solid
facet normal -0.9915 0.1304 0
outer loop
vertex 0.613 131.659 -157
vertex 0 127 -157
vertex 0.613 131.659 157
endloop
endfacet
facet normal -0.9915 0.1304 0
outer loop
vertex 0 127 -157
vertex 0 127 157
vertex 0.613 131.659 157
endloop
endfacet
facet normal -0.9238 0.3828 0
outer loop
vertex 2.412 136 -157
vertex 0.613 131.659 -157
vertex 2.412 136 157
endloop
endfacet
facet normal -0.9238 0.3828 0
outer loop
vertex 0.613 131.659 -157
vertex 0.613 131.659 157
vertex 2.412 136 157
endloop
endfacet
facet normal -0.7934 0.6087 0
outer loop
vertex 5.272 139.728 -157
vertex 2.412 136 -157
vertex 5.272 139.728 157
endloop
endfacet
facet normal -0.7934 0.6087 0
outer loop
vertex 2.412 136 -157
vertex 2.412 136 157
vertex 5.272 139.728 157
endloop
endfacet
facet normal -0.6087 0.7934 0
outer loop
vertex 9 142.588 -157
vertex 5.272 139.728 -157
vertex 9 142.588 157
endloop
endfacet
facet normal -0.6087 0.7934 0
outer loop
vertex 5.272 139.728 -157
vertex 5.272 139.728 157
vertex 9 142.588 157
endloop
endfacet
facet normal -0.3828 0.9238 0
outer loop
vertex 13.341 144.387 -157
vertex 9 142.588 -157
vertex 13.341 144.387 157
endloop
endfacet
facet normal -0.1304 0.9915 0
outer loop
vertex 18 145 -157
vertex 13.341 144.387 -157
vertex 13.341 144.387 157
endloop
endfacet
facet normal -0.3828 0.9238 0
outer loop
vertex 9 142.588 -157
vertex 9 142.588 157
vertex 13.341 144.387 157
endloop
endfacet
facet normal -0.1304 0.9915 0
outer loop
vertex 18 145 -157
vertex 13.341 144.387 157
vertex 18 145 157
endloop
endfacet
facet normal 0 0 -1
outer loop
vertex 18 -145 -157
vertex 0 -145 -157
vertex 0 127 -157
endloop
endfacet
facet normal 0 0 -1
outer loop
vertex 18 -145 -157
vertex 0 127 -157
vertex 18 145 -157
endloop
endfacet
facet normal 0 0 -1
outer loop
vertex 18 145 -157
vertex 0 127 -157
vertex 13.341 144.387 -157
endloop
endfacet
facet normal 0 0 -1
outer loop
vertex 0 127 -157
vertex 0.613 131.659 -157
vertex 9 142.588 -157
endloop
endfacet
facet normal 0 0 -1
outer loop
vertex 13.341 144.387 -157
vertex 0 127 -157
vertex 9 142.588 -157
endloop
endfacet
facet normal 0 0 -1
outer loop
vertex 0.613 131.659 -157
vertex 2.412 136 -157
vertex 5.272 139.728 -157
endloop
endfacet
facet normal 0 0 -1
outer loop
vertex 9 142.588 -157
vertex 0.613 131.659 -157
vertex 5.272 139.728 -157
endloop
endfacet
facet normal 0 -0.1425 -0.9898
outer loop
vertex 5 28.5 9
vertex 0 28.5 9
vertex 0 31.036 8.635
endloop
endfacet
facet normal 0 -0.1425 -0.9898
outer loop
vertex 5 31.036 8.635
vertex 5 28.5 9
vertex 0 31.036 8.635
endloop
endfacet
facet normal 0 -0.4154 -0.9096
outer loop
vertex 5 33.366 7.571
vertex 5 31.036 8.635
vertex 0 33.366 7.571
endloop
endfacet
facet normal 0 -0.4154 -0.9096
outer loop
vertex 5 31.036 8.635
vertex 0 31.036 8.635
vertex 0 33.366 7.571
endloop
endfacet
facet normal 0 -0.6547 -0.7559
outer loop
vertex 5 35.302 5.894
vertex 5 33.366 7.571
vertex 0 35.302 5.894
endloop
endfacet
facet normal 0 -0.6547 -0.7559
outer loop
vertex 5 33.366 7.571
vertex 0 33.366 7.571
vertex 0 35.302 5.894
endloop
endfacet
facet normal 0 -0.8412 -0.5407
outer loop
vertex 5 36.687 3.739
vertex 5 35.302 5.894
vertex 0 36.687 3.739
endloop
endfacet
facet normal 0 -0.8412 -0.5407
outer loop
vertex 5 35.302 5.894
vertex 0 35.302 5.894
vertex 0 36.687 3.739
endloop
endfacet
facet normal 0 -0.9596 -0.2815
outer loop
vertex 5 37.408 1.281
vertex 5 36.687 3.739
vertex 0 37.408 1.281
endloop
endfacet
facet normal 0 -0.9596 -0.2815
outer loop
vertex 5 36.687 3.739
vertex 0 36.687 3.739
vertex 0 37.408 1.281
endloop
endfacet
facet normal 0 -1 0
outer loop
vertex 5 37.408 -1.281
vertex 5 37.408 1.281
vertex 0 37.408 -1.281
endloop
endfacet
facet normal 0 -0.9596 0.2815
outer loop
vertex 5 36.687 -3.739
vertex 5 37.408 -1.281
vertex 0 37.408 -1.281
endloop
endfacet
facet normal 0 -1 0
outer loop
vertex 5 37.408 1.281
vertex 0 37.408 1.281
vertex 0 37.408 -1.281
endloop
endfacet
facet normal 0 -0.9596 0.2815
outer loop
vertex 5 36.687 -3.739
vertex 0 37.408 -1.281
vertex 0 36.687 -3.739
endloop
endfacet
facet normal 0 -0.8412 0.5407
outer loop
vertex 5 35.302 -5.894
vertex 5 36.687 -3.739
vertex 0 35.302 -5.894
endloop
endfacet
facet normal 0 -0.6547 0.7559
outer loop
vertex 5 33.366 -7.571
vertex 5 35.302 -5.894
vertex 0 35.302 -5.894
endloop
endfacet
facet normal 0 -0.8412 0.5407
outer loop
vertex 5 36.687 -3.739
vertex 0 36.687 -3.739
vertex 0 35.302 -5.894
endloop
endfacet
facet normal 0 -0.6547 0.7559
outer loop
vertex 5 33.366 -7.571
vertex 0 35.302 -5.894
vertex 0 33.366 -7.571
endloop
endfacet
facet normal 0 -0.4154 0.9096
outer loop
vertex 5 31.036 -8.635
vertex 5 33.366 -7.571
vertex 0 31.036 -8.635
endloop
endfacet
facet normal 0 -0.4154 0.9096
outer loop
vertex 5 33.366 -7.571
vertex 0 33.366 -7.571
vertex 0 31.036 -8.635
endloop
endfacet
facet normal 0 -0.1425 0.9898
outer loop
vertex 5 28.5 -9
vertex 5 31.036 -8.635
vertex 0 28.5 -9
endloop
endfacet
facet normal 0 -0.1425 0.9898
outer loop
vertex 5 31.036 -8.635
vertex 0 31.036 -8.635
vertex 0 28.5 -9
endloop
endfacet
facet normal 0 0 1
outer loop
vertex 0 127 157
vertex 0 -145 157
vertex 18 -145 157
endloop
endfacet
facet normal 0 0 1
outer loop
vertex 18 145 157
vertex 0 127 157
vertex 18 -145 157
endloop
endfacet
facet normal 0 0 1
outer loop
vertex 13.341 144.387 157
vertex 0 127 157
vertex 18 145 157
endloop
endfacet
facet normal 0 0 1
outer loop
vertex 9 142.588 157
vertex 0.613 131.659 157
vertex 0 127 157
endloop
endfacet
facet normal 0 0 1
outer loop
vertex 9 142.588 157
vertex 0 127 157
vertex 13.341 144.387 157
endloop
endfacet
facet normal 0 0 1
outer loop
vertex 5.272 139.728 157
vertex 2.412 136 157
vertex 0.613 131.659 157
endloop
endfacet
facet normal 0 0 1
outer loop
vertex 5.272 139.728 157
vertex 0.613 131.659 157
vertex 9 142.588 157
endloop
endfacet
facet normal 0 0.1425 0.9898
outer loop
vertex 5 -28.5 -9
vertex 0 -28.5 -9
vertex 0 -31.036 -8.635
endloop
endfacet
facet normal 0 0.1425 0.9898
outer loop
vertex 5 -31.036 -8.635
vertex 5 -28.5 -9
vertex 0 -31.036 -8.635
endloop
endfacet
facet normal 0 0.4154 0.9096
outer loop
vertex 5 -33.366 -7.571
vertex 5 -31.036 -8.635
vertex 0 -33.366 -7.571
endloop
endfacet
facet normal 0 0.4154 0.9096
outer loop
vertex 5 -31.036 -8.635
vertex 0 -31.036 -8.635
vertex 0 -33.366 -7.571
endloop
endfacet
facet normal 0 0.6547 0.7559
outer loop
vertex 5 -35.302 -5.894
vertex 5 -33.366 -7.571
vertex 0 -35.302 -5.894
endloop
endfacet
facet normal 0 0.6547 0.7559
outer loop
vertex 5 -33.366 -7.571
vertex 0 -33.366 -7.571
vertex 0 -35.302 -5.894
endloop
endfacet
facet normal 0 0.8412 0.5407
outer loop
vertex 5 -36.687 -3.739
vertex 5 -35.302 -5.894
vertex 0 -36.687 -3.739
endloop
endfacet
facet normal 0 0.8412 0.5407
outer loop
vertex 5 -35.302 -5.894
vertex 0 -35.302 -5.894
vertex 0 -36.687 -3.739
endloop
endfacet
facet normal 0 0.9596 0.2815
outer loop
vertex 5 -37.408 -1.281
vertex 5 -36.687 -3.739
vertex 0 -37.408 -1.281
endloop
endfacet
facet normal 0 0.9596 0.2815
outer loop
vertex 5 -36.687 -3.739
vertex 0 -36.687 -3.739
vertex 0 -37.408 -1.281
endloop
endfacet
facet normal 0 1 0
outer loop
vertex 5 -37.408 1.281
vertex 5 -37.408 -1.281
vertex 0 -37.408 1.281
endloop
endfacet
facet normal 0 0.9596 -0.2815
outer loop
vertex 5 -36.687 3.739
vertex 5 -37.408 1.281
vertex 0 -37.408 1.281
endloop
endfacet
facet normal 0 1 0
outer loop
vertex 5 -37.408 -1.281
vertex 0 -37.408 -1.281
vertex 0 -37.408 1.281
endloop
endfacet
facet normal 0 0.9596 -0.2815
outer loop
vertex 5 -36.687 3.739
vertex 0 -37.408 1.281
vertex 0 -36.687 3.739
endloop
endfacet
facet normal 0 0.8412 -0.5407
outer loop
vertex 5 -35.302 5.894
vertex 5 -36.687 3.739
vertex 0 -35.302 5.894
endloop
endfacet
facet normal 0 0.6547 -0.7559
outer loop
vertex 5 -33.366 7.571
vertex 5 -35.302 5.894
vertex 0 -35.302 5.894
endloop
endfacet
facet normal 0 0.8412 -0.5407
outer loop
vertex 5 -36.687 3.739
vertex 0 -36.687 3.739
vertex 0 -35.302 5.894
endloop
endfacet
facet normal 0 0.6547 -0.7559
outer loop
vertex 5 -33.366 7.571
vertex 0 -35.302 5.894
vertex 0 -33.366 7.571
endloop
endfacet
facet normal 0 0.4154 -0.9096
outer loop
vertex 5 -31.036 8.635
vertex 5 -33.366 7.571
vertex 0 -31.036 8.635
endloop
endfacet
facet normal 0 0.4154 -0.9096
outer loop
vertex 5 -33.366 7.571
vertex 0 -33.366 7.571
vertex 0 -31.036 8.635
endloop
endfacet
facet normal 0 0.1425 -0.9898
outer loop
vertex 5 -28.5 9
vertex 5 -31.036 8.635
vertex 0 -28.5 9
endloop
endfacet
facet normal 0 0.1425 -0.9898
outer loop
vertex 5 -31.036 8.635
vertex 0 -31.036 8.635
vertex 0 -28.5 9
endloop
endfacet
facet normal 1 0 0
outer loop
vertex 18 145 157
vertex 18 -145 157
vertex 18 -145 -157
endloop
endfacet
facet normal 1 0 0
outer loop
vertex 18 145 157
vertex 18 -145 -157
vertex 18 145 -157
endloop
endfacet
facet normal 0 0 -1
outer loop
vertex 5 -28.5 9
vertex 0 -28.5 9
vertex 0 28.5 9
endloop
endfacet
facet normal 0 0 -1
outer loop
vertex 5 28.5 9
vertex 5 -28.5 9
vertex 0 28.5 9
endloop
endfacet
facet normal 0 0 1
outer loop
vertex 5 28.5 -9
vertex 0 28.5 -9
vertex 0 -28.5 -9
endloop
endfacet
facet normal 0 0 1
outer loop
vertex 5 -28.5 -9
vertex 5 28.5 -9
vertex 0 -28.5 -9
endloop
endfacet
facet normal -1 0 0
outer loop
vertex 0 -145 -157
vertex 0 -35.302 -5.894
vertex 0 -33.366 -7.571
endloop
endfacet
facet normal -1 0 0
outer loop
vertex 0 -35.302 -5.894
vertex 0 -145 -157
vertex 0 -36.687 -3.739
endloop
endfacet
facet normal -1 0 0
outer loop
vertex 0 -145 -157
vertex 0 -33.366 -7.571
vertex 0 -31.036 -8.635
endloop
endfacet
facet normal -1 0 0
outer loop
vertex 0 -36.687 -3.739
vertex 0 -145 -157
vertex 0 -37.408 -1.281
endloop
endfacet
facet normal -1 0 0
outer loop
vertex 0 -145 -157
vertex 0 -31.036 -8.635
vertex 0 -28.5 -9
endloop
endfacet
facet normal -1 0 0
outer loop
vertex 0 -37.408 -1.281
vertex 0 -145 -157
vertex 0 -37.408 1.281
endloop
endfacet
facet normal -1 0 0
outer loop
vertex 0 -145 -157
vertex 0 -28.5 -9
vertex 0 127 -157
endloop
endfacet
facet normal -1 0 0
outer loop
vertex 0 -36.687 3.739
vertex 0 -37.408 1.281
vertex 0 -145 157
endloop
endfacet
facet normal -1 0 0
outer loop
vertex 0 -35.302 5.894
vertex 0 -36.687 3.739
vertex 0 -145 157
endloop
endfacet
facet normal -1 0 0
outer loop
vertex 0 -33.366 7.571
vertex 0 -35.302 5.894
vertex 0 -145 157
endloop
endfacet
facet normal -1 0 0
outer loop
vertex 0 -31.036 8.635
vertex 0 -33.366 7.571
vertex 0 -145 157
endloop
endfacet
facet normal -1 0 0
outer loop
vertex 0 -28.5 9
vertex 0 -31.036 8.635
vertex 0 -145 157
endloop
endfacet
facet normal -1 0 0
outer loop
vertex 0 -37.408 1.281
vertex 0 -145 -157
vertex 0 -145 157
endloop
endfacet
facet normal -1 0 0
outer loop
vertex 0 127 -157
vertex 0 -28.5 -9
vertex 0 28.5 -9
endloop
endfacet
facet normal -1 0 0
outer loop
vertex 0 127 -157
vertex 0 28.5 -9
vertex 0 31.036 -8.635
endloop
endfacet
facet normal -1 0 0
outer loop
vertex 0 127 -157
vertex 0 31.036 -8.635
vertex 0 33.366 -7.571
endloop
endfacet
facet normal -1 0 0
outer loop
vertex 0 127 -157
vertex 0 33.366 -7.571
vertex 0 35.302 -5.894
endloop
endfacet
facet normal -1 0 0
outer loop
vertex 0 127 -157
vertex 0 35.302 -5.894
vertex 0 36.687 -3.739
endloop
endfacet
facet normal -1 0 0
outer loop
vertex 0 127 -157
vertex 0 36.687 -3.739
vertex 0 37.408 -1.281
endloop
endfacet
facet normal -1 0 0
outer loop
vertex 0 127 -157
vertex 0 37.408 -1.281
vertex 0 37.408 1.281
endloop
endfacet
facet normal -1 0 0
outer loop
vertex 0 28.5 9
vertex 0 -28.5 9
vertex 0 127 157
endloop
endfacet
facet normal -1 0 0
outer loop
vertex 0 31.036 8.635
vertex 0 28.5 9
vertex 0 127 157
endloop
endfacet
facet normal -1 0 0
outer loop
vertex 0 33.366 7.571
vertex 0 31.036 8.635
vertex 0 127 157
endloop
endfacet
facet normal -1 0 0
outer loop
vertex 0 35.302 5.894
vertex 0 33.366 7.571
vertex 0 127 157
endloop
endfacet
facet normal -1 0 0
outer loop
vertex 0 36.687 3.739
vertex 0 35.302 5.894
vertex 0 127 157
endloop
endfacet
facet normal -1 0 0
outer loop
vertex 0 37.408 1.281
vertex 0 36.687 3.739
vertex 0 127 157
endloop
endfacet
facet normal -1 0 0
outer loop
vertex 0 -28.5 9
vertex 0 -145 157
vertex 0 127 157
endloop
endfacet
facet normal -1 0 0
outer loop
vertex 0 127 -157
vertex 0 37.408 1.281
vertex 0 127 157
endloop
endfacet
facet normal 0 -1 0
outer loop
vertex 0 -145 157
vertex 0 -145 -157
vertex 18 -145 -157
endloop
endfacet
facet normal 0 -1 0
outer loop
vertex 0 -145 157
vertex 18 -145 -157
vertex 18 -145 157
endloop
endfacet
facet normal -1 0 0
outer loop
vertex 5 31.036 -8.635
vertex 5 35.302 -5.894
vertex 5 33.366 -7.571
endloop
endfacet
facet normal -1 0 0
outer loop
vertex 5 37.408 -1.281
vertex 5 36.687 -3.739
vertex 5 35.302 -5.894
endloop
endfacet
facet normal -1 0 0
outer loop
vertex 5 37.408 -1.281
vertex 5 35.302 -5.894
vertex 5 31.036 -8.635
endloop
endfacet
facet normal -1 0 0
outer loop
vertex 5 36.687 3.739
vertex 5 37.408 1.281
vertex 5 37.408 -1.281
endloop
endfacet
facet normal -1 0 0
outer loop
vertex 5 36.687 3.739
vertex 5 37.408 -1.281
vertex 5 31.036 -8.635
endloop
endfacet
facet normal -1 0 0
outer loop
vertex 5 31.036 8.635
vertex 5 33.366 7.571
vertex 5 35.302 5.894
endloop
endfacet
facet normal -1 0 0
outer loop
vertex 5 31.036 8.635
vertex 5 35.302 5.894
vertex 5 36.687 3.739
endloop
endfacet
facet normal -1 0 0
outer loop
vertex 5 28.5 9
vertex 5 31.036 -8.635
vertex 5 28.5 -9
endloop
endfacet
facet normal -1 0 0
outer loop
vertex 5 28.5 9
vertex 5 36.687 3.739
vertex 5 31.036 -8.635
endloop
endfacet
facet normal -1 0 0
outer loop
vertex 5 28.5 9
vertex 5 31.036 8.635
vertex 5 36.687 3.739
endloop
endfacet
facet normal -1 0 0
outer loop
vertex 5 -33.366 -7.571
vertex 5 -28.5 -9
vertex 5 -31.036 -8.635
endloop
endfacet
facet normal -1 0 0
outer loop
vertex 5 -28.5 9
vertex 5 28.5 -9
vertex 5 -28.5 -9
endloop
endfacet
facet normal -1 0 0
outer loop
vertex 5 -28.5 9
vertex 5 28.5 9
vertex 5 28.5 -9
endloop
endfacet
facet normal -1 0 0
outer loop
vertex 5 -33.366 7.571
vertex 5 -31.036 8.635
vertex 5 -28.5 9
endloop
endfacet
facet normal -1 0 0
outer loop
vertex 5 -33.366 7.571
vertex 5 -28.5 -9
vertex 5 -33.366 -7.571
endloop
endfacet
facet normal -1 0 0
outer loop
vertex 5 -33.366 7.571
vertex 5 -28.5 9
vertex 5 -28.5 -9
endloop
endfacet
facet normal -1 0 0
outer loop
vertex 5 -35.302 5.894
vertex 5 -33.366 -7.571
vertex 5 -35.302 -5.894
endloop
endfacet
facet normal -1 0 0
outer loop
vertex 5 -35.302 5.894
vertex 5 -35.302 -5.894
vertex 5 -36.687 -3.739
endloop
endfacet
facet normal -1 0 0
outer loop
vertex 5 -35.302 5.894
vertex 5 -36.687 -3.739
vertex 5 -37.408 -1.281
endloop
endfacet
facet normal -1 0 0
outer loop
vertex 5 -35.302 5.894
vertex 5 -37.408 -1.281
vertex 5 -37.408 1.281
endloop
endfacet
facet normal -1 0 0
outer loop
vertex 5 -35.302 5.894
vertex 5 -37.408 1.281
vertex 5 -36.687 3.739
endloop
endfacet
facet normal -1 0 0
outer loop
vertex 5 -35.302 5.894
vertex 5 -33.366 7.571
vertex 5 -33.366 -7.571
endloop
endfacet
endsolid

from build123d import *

# Parameters (mm, degrees)
F0_W     = 290
F0_H     = 314
F1_DEPTH = 18
F3_DEPTH = 5
F4_R     = 17.99999


# Not quite as in the source:
# - a fillet or chamfer is up to 0.001 mm smaller than in the source, because OpenCascade refuses the exact size


with BuildPart() as f1:
    # F0 (on Right) → F1 (new body)
    with BuildSketch(Plane.YZ):
        Rectangle(F0_W, F0_H)
    extrude(amount=F1_DEPTH)

    # F2 (on face) → F3 (cut)
    with BuildSketch(Plane(origin=(0, 0, 0), x_dir=(0, -1, 0), z_dir=(-1, 0, 0))):
        with BuildLine():
            Line((28.5, 9), (-28.5, 9))
            ThreePointArc((-28.5, 9), (-37.5, 0), (-28.5, -9))
            Line((-28.5, -9), (28.5, -9))
            ThreePointArc((28.5, -9), (37.5, 0), (28.5, 9))
        make_face()
    extrude(amount=-F3_DEPTH, mode=Mode.SUBTRACT)

    # F4 (radius 18 in the source; OpenCascade refuses exactly that, so slightly less here)
    f4_edges = [f1.edges().sort_by_distance(p)[0] for p in [
        (0, 145, 0),
    ]]
    fillet(f4_edges, radius=F4_R)


solid = f1.part
